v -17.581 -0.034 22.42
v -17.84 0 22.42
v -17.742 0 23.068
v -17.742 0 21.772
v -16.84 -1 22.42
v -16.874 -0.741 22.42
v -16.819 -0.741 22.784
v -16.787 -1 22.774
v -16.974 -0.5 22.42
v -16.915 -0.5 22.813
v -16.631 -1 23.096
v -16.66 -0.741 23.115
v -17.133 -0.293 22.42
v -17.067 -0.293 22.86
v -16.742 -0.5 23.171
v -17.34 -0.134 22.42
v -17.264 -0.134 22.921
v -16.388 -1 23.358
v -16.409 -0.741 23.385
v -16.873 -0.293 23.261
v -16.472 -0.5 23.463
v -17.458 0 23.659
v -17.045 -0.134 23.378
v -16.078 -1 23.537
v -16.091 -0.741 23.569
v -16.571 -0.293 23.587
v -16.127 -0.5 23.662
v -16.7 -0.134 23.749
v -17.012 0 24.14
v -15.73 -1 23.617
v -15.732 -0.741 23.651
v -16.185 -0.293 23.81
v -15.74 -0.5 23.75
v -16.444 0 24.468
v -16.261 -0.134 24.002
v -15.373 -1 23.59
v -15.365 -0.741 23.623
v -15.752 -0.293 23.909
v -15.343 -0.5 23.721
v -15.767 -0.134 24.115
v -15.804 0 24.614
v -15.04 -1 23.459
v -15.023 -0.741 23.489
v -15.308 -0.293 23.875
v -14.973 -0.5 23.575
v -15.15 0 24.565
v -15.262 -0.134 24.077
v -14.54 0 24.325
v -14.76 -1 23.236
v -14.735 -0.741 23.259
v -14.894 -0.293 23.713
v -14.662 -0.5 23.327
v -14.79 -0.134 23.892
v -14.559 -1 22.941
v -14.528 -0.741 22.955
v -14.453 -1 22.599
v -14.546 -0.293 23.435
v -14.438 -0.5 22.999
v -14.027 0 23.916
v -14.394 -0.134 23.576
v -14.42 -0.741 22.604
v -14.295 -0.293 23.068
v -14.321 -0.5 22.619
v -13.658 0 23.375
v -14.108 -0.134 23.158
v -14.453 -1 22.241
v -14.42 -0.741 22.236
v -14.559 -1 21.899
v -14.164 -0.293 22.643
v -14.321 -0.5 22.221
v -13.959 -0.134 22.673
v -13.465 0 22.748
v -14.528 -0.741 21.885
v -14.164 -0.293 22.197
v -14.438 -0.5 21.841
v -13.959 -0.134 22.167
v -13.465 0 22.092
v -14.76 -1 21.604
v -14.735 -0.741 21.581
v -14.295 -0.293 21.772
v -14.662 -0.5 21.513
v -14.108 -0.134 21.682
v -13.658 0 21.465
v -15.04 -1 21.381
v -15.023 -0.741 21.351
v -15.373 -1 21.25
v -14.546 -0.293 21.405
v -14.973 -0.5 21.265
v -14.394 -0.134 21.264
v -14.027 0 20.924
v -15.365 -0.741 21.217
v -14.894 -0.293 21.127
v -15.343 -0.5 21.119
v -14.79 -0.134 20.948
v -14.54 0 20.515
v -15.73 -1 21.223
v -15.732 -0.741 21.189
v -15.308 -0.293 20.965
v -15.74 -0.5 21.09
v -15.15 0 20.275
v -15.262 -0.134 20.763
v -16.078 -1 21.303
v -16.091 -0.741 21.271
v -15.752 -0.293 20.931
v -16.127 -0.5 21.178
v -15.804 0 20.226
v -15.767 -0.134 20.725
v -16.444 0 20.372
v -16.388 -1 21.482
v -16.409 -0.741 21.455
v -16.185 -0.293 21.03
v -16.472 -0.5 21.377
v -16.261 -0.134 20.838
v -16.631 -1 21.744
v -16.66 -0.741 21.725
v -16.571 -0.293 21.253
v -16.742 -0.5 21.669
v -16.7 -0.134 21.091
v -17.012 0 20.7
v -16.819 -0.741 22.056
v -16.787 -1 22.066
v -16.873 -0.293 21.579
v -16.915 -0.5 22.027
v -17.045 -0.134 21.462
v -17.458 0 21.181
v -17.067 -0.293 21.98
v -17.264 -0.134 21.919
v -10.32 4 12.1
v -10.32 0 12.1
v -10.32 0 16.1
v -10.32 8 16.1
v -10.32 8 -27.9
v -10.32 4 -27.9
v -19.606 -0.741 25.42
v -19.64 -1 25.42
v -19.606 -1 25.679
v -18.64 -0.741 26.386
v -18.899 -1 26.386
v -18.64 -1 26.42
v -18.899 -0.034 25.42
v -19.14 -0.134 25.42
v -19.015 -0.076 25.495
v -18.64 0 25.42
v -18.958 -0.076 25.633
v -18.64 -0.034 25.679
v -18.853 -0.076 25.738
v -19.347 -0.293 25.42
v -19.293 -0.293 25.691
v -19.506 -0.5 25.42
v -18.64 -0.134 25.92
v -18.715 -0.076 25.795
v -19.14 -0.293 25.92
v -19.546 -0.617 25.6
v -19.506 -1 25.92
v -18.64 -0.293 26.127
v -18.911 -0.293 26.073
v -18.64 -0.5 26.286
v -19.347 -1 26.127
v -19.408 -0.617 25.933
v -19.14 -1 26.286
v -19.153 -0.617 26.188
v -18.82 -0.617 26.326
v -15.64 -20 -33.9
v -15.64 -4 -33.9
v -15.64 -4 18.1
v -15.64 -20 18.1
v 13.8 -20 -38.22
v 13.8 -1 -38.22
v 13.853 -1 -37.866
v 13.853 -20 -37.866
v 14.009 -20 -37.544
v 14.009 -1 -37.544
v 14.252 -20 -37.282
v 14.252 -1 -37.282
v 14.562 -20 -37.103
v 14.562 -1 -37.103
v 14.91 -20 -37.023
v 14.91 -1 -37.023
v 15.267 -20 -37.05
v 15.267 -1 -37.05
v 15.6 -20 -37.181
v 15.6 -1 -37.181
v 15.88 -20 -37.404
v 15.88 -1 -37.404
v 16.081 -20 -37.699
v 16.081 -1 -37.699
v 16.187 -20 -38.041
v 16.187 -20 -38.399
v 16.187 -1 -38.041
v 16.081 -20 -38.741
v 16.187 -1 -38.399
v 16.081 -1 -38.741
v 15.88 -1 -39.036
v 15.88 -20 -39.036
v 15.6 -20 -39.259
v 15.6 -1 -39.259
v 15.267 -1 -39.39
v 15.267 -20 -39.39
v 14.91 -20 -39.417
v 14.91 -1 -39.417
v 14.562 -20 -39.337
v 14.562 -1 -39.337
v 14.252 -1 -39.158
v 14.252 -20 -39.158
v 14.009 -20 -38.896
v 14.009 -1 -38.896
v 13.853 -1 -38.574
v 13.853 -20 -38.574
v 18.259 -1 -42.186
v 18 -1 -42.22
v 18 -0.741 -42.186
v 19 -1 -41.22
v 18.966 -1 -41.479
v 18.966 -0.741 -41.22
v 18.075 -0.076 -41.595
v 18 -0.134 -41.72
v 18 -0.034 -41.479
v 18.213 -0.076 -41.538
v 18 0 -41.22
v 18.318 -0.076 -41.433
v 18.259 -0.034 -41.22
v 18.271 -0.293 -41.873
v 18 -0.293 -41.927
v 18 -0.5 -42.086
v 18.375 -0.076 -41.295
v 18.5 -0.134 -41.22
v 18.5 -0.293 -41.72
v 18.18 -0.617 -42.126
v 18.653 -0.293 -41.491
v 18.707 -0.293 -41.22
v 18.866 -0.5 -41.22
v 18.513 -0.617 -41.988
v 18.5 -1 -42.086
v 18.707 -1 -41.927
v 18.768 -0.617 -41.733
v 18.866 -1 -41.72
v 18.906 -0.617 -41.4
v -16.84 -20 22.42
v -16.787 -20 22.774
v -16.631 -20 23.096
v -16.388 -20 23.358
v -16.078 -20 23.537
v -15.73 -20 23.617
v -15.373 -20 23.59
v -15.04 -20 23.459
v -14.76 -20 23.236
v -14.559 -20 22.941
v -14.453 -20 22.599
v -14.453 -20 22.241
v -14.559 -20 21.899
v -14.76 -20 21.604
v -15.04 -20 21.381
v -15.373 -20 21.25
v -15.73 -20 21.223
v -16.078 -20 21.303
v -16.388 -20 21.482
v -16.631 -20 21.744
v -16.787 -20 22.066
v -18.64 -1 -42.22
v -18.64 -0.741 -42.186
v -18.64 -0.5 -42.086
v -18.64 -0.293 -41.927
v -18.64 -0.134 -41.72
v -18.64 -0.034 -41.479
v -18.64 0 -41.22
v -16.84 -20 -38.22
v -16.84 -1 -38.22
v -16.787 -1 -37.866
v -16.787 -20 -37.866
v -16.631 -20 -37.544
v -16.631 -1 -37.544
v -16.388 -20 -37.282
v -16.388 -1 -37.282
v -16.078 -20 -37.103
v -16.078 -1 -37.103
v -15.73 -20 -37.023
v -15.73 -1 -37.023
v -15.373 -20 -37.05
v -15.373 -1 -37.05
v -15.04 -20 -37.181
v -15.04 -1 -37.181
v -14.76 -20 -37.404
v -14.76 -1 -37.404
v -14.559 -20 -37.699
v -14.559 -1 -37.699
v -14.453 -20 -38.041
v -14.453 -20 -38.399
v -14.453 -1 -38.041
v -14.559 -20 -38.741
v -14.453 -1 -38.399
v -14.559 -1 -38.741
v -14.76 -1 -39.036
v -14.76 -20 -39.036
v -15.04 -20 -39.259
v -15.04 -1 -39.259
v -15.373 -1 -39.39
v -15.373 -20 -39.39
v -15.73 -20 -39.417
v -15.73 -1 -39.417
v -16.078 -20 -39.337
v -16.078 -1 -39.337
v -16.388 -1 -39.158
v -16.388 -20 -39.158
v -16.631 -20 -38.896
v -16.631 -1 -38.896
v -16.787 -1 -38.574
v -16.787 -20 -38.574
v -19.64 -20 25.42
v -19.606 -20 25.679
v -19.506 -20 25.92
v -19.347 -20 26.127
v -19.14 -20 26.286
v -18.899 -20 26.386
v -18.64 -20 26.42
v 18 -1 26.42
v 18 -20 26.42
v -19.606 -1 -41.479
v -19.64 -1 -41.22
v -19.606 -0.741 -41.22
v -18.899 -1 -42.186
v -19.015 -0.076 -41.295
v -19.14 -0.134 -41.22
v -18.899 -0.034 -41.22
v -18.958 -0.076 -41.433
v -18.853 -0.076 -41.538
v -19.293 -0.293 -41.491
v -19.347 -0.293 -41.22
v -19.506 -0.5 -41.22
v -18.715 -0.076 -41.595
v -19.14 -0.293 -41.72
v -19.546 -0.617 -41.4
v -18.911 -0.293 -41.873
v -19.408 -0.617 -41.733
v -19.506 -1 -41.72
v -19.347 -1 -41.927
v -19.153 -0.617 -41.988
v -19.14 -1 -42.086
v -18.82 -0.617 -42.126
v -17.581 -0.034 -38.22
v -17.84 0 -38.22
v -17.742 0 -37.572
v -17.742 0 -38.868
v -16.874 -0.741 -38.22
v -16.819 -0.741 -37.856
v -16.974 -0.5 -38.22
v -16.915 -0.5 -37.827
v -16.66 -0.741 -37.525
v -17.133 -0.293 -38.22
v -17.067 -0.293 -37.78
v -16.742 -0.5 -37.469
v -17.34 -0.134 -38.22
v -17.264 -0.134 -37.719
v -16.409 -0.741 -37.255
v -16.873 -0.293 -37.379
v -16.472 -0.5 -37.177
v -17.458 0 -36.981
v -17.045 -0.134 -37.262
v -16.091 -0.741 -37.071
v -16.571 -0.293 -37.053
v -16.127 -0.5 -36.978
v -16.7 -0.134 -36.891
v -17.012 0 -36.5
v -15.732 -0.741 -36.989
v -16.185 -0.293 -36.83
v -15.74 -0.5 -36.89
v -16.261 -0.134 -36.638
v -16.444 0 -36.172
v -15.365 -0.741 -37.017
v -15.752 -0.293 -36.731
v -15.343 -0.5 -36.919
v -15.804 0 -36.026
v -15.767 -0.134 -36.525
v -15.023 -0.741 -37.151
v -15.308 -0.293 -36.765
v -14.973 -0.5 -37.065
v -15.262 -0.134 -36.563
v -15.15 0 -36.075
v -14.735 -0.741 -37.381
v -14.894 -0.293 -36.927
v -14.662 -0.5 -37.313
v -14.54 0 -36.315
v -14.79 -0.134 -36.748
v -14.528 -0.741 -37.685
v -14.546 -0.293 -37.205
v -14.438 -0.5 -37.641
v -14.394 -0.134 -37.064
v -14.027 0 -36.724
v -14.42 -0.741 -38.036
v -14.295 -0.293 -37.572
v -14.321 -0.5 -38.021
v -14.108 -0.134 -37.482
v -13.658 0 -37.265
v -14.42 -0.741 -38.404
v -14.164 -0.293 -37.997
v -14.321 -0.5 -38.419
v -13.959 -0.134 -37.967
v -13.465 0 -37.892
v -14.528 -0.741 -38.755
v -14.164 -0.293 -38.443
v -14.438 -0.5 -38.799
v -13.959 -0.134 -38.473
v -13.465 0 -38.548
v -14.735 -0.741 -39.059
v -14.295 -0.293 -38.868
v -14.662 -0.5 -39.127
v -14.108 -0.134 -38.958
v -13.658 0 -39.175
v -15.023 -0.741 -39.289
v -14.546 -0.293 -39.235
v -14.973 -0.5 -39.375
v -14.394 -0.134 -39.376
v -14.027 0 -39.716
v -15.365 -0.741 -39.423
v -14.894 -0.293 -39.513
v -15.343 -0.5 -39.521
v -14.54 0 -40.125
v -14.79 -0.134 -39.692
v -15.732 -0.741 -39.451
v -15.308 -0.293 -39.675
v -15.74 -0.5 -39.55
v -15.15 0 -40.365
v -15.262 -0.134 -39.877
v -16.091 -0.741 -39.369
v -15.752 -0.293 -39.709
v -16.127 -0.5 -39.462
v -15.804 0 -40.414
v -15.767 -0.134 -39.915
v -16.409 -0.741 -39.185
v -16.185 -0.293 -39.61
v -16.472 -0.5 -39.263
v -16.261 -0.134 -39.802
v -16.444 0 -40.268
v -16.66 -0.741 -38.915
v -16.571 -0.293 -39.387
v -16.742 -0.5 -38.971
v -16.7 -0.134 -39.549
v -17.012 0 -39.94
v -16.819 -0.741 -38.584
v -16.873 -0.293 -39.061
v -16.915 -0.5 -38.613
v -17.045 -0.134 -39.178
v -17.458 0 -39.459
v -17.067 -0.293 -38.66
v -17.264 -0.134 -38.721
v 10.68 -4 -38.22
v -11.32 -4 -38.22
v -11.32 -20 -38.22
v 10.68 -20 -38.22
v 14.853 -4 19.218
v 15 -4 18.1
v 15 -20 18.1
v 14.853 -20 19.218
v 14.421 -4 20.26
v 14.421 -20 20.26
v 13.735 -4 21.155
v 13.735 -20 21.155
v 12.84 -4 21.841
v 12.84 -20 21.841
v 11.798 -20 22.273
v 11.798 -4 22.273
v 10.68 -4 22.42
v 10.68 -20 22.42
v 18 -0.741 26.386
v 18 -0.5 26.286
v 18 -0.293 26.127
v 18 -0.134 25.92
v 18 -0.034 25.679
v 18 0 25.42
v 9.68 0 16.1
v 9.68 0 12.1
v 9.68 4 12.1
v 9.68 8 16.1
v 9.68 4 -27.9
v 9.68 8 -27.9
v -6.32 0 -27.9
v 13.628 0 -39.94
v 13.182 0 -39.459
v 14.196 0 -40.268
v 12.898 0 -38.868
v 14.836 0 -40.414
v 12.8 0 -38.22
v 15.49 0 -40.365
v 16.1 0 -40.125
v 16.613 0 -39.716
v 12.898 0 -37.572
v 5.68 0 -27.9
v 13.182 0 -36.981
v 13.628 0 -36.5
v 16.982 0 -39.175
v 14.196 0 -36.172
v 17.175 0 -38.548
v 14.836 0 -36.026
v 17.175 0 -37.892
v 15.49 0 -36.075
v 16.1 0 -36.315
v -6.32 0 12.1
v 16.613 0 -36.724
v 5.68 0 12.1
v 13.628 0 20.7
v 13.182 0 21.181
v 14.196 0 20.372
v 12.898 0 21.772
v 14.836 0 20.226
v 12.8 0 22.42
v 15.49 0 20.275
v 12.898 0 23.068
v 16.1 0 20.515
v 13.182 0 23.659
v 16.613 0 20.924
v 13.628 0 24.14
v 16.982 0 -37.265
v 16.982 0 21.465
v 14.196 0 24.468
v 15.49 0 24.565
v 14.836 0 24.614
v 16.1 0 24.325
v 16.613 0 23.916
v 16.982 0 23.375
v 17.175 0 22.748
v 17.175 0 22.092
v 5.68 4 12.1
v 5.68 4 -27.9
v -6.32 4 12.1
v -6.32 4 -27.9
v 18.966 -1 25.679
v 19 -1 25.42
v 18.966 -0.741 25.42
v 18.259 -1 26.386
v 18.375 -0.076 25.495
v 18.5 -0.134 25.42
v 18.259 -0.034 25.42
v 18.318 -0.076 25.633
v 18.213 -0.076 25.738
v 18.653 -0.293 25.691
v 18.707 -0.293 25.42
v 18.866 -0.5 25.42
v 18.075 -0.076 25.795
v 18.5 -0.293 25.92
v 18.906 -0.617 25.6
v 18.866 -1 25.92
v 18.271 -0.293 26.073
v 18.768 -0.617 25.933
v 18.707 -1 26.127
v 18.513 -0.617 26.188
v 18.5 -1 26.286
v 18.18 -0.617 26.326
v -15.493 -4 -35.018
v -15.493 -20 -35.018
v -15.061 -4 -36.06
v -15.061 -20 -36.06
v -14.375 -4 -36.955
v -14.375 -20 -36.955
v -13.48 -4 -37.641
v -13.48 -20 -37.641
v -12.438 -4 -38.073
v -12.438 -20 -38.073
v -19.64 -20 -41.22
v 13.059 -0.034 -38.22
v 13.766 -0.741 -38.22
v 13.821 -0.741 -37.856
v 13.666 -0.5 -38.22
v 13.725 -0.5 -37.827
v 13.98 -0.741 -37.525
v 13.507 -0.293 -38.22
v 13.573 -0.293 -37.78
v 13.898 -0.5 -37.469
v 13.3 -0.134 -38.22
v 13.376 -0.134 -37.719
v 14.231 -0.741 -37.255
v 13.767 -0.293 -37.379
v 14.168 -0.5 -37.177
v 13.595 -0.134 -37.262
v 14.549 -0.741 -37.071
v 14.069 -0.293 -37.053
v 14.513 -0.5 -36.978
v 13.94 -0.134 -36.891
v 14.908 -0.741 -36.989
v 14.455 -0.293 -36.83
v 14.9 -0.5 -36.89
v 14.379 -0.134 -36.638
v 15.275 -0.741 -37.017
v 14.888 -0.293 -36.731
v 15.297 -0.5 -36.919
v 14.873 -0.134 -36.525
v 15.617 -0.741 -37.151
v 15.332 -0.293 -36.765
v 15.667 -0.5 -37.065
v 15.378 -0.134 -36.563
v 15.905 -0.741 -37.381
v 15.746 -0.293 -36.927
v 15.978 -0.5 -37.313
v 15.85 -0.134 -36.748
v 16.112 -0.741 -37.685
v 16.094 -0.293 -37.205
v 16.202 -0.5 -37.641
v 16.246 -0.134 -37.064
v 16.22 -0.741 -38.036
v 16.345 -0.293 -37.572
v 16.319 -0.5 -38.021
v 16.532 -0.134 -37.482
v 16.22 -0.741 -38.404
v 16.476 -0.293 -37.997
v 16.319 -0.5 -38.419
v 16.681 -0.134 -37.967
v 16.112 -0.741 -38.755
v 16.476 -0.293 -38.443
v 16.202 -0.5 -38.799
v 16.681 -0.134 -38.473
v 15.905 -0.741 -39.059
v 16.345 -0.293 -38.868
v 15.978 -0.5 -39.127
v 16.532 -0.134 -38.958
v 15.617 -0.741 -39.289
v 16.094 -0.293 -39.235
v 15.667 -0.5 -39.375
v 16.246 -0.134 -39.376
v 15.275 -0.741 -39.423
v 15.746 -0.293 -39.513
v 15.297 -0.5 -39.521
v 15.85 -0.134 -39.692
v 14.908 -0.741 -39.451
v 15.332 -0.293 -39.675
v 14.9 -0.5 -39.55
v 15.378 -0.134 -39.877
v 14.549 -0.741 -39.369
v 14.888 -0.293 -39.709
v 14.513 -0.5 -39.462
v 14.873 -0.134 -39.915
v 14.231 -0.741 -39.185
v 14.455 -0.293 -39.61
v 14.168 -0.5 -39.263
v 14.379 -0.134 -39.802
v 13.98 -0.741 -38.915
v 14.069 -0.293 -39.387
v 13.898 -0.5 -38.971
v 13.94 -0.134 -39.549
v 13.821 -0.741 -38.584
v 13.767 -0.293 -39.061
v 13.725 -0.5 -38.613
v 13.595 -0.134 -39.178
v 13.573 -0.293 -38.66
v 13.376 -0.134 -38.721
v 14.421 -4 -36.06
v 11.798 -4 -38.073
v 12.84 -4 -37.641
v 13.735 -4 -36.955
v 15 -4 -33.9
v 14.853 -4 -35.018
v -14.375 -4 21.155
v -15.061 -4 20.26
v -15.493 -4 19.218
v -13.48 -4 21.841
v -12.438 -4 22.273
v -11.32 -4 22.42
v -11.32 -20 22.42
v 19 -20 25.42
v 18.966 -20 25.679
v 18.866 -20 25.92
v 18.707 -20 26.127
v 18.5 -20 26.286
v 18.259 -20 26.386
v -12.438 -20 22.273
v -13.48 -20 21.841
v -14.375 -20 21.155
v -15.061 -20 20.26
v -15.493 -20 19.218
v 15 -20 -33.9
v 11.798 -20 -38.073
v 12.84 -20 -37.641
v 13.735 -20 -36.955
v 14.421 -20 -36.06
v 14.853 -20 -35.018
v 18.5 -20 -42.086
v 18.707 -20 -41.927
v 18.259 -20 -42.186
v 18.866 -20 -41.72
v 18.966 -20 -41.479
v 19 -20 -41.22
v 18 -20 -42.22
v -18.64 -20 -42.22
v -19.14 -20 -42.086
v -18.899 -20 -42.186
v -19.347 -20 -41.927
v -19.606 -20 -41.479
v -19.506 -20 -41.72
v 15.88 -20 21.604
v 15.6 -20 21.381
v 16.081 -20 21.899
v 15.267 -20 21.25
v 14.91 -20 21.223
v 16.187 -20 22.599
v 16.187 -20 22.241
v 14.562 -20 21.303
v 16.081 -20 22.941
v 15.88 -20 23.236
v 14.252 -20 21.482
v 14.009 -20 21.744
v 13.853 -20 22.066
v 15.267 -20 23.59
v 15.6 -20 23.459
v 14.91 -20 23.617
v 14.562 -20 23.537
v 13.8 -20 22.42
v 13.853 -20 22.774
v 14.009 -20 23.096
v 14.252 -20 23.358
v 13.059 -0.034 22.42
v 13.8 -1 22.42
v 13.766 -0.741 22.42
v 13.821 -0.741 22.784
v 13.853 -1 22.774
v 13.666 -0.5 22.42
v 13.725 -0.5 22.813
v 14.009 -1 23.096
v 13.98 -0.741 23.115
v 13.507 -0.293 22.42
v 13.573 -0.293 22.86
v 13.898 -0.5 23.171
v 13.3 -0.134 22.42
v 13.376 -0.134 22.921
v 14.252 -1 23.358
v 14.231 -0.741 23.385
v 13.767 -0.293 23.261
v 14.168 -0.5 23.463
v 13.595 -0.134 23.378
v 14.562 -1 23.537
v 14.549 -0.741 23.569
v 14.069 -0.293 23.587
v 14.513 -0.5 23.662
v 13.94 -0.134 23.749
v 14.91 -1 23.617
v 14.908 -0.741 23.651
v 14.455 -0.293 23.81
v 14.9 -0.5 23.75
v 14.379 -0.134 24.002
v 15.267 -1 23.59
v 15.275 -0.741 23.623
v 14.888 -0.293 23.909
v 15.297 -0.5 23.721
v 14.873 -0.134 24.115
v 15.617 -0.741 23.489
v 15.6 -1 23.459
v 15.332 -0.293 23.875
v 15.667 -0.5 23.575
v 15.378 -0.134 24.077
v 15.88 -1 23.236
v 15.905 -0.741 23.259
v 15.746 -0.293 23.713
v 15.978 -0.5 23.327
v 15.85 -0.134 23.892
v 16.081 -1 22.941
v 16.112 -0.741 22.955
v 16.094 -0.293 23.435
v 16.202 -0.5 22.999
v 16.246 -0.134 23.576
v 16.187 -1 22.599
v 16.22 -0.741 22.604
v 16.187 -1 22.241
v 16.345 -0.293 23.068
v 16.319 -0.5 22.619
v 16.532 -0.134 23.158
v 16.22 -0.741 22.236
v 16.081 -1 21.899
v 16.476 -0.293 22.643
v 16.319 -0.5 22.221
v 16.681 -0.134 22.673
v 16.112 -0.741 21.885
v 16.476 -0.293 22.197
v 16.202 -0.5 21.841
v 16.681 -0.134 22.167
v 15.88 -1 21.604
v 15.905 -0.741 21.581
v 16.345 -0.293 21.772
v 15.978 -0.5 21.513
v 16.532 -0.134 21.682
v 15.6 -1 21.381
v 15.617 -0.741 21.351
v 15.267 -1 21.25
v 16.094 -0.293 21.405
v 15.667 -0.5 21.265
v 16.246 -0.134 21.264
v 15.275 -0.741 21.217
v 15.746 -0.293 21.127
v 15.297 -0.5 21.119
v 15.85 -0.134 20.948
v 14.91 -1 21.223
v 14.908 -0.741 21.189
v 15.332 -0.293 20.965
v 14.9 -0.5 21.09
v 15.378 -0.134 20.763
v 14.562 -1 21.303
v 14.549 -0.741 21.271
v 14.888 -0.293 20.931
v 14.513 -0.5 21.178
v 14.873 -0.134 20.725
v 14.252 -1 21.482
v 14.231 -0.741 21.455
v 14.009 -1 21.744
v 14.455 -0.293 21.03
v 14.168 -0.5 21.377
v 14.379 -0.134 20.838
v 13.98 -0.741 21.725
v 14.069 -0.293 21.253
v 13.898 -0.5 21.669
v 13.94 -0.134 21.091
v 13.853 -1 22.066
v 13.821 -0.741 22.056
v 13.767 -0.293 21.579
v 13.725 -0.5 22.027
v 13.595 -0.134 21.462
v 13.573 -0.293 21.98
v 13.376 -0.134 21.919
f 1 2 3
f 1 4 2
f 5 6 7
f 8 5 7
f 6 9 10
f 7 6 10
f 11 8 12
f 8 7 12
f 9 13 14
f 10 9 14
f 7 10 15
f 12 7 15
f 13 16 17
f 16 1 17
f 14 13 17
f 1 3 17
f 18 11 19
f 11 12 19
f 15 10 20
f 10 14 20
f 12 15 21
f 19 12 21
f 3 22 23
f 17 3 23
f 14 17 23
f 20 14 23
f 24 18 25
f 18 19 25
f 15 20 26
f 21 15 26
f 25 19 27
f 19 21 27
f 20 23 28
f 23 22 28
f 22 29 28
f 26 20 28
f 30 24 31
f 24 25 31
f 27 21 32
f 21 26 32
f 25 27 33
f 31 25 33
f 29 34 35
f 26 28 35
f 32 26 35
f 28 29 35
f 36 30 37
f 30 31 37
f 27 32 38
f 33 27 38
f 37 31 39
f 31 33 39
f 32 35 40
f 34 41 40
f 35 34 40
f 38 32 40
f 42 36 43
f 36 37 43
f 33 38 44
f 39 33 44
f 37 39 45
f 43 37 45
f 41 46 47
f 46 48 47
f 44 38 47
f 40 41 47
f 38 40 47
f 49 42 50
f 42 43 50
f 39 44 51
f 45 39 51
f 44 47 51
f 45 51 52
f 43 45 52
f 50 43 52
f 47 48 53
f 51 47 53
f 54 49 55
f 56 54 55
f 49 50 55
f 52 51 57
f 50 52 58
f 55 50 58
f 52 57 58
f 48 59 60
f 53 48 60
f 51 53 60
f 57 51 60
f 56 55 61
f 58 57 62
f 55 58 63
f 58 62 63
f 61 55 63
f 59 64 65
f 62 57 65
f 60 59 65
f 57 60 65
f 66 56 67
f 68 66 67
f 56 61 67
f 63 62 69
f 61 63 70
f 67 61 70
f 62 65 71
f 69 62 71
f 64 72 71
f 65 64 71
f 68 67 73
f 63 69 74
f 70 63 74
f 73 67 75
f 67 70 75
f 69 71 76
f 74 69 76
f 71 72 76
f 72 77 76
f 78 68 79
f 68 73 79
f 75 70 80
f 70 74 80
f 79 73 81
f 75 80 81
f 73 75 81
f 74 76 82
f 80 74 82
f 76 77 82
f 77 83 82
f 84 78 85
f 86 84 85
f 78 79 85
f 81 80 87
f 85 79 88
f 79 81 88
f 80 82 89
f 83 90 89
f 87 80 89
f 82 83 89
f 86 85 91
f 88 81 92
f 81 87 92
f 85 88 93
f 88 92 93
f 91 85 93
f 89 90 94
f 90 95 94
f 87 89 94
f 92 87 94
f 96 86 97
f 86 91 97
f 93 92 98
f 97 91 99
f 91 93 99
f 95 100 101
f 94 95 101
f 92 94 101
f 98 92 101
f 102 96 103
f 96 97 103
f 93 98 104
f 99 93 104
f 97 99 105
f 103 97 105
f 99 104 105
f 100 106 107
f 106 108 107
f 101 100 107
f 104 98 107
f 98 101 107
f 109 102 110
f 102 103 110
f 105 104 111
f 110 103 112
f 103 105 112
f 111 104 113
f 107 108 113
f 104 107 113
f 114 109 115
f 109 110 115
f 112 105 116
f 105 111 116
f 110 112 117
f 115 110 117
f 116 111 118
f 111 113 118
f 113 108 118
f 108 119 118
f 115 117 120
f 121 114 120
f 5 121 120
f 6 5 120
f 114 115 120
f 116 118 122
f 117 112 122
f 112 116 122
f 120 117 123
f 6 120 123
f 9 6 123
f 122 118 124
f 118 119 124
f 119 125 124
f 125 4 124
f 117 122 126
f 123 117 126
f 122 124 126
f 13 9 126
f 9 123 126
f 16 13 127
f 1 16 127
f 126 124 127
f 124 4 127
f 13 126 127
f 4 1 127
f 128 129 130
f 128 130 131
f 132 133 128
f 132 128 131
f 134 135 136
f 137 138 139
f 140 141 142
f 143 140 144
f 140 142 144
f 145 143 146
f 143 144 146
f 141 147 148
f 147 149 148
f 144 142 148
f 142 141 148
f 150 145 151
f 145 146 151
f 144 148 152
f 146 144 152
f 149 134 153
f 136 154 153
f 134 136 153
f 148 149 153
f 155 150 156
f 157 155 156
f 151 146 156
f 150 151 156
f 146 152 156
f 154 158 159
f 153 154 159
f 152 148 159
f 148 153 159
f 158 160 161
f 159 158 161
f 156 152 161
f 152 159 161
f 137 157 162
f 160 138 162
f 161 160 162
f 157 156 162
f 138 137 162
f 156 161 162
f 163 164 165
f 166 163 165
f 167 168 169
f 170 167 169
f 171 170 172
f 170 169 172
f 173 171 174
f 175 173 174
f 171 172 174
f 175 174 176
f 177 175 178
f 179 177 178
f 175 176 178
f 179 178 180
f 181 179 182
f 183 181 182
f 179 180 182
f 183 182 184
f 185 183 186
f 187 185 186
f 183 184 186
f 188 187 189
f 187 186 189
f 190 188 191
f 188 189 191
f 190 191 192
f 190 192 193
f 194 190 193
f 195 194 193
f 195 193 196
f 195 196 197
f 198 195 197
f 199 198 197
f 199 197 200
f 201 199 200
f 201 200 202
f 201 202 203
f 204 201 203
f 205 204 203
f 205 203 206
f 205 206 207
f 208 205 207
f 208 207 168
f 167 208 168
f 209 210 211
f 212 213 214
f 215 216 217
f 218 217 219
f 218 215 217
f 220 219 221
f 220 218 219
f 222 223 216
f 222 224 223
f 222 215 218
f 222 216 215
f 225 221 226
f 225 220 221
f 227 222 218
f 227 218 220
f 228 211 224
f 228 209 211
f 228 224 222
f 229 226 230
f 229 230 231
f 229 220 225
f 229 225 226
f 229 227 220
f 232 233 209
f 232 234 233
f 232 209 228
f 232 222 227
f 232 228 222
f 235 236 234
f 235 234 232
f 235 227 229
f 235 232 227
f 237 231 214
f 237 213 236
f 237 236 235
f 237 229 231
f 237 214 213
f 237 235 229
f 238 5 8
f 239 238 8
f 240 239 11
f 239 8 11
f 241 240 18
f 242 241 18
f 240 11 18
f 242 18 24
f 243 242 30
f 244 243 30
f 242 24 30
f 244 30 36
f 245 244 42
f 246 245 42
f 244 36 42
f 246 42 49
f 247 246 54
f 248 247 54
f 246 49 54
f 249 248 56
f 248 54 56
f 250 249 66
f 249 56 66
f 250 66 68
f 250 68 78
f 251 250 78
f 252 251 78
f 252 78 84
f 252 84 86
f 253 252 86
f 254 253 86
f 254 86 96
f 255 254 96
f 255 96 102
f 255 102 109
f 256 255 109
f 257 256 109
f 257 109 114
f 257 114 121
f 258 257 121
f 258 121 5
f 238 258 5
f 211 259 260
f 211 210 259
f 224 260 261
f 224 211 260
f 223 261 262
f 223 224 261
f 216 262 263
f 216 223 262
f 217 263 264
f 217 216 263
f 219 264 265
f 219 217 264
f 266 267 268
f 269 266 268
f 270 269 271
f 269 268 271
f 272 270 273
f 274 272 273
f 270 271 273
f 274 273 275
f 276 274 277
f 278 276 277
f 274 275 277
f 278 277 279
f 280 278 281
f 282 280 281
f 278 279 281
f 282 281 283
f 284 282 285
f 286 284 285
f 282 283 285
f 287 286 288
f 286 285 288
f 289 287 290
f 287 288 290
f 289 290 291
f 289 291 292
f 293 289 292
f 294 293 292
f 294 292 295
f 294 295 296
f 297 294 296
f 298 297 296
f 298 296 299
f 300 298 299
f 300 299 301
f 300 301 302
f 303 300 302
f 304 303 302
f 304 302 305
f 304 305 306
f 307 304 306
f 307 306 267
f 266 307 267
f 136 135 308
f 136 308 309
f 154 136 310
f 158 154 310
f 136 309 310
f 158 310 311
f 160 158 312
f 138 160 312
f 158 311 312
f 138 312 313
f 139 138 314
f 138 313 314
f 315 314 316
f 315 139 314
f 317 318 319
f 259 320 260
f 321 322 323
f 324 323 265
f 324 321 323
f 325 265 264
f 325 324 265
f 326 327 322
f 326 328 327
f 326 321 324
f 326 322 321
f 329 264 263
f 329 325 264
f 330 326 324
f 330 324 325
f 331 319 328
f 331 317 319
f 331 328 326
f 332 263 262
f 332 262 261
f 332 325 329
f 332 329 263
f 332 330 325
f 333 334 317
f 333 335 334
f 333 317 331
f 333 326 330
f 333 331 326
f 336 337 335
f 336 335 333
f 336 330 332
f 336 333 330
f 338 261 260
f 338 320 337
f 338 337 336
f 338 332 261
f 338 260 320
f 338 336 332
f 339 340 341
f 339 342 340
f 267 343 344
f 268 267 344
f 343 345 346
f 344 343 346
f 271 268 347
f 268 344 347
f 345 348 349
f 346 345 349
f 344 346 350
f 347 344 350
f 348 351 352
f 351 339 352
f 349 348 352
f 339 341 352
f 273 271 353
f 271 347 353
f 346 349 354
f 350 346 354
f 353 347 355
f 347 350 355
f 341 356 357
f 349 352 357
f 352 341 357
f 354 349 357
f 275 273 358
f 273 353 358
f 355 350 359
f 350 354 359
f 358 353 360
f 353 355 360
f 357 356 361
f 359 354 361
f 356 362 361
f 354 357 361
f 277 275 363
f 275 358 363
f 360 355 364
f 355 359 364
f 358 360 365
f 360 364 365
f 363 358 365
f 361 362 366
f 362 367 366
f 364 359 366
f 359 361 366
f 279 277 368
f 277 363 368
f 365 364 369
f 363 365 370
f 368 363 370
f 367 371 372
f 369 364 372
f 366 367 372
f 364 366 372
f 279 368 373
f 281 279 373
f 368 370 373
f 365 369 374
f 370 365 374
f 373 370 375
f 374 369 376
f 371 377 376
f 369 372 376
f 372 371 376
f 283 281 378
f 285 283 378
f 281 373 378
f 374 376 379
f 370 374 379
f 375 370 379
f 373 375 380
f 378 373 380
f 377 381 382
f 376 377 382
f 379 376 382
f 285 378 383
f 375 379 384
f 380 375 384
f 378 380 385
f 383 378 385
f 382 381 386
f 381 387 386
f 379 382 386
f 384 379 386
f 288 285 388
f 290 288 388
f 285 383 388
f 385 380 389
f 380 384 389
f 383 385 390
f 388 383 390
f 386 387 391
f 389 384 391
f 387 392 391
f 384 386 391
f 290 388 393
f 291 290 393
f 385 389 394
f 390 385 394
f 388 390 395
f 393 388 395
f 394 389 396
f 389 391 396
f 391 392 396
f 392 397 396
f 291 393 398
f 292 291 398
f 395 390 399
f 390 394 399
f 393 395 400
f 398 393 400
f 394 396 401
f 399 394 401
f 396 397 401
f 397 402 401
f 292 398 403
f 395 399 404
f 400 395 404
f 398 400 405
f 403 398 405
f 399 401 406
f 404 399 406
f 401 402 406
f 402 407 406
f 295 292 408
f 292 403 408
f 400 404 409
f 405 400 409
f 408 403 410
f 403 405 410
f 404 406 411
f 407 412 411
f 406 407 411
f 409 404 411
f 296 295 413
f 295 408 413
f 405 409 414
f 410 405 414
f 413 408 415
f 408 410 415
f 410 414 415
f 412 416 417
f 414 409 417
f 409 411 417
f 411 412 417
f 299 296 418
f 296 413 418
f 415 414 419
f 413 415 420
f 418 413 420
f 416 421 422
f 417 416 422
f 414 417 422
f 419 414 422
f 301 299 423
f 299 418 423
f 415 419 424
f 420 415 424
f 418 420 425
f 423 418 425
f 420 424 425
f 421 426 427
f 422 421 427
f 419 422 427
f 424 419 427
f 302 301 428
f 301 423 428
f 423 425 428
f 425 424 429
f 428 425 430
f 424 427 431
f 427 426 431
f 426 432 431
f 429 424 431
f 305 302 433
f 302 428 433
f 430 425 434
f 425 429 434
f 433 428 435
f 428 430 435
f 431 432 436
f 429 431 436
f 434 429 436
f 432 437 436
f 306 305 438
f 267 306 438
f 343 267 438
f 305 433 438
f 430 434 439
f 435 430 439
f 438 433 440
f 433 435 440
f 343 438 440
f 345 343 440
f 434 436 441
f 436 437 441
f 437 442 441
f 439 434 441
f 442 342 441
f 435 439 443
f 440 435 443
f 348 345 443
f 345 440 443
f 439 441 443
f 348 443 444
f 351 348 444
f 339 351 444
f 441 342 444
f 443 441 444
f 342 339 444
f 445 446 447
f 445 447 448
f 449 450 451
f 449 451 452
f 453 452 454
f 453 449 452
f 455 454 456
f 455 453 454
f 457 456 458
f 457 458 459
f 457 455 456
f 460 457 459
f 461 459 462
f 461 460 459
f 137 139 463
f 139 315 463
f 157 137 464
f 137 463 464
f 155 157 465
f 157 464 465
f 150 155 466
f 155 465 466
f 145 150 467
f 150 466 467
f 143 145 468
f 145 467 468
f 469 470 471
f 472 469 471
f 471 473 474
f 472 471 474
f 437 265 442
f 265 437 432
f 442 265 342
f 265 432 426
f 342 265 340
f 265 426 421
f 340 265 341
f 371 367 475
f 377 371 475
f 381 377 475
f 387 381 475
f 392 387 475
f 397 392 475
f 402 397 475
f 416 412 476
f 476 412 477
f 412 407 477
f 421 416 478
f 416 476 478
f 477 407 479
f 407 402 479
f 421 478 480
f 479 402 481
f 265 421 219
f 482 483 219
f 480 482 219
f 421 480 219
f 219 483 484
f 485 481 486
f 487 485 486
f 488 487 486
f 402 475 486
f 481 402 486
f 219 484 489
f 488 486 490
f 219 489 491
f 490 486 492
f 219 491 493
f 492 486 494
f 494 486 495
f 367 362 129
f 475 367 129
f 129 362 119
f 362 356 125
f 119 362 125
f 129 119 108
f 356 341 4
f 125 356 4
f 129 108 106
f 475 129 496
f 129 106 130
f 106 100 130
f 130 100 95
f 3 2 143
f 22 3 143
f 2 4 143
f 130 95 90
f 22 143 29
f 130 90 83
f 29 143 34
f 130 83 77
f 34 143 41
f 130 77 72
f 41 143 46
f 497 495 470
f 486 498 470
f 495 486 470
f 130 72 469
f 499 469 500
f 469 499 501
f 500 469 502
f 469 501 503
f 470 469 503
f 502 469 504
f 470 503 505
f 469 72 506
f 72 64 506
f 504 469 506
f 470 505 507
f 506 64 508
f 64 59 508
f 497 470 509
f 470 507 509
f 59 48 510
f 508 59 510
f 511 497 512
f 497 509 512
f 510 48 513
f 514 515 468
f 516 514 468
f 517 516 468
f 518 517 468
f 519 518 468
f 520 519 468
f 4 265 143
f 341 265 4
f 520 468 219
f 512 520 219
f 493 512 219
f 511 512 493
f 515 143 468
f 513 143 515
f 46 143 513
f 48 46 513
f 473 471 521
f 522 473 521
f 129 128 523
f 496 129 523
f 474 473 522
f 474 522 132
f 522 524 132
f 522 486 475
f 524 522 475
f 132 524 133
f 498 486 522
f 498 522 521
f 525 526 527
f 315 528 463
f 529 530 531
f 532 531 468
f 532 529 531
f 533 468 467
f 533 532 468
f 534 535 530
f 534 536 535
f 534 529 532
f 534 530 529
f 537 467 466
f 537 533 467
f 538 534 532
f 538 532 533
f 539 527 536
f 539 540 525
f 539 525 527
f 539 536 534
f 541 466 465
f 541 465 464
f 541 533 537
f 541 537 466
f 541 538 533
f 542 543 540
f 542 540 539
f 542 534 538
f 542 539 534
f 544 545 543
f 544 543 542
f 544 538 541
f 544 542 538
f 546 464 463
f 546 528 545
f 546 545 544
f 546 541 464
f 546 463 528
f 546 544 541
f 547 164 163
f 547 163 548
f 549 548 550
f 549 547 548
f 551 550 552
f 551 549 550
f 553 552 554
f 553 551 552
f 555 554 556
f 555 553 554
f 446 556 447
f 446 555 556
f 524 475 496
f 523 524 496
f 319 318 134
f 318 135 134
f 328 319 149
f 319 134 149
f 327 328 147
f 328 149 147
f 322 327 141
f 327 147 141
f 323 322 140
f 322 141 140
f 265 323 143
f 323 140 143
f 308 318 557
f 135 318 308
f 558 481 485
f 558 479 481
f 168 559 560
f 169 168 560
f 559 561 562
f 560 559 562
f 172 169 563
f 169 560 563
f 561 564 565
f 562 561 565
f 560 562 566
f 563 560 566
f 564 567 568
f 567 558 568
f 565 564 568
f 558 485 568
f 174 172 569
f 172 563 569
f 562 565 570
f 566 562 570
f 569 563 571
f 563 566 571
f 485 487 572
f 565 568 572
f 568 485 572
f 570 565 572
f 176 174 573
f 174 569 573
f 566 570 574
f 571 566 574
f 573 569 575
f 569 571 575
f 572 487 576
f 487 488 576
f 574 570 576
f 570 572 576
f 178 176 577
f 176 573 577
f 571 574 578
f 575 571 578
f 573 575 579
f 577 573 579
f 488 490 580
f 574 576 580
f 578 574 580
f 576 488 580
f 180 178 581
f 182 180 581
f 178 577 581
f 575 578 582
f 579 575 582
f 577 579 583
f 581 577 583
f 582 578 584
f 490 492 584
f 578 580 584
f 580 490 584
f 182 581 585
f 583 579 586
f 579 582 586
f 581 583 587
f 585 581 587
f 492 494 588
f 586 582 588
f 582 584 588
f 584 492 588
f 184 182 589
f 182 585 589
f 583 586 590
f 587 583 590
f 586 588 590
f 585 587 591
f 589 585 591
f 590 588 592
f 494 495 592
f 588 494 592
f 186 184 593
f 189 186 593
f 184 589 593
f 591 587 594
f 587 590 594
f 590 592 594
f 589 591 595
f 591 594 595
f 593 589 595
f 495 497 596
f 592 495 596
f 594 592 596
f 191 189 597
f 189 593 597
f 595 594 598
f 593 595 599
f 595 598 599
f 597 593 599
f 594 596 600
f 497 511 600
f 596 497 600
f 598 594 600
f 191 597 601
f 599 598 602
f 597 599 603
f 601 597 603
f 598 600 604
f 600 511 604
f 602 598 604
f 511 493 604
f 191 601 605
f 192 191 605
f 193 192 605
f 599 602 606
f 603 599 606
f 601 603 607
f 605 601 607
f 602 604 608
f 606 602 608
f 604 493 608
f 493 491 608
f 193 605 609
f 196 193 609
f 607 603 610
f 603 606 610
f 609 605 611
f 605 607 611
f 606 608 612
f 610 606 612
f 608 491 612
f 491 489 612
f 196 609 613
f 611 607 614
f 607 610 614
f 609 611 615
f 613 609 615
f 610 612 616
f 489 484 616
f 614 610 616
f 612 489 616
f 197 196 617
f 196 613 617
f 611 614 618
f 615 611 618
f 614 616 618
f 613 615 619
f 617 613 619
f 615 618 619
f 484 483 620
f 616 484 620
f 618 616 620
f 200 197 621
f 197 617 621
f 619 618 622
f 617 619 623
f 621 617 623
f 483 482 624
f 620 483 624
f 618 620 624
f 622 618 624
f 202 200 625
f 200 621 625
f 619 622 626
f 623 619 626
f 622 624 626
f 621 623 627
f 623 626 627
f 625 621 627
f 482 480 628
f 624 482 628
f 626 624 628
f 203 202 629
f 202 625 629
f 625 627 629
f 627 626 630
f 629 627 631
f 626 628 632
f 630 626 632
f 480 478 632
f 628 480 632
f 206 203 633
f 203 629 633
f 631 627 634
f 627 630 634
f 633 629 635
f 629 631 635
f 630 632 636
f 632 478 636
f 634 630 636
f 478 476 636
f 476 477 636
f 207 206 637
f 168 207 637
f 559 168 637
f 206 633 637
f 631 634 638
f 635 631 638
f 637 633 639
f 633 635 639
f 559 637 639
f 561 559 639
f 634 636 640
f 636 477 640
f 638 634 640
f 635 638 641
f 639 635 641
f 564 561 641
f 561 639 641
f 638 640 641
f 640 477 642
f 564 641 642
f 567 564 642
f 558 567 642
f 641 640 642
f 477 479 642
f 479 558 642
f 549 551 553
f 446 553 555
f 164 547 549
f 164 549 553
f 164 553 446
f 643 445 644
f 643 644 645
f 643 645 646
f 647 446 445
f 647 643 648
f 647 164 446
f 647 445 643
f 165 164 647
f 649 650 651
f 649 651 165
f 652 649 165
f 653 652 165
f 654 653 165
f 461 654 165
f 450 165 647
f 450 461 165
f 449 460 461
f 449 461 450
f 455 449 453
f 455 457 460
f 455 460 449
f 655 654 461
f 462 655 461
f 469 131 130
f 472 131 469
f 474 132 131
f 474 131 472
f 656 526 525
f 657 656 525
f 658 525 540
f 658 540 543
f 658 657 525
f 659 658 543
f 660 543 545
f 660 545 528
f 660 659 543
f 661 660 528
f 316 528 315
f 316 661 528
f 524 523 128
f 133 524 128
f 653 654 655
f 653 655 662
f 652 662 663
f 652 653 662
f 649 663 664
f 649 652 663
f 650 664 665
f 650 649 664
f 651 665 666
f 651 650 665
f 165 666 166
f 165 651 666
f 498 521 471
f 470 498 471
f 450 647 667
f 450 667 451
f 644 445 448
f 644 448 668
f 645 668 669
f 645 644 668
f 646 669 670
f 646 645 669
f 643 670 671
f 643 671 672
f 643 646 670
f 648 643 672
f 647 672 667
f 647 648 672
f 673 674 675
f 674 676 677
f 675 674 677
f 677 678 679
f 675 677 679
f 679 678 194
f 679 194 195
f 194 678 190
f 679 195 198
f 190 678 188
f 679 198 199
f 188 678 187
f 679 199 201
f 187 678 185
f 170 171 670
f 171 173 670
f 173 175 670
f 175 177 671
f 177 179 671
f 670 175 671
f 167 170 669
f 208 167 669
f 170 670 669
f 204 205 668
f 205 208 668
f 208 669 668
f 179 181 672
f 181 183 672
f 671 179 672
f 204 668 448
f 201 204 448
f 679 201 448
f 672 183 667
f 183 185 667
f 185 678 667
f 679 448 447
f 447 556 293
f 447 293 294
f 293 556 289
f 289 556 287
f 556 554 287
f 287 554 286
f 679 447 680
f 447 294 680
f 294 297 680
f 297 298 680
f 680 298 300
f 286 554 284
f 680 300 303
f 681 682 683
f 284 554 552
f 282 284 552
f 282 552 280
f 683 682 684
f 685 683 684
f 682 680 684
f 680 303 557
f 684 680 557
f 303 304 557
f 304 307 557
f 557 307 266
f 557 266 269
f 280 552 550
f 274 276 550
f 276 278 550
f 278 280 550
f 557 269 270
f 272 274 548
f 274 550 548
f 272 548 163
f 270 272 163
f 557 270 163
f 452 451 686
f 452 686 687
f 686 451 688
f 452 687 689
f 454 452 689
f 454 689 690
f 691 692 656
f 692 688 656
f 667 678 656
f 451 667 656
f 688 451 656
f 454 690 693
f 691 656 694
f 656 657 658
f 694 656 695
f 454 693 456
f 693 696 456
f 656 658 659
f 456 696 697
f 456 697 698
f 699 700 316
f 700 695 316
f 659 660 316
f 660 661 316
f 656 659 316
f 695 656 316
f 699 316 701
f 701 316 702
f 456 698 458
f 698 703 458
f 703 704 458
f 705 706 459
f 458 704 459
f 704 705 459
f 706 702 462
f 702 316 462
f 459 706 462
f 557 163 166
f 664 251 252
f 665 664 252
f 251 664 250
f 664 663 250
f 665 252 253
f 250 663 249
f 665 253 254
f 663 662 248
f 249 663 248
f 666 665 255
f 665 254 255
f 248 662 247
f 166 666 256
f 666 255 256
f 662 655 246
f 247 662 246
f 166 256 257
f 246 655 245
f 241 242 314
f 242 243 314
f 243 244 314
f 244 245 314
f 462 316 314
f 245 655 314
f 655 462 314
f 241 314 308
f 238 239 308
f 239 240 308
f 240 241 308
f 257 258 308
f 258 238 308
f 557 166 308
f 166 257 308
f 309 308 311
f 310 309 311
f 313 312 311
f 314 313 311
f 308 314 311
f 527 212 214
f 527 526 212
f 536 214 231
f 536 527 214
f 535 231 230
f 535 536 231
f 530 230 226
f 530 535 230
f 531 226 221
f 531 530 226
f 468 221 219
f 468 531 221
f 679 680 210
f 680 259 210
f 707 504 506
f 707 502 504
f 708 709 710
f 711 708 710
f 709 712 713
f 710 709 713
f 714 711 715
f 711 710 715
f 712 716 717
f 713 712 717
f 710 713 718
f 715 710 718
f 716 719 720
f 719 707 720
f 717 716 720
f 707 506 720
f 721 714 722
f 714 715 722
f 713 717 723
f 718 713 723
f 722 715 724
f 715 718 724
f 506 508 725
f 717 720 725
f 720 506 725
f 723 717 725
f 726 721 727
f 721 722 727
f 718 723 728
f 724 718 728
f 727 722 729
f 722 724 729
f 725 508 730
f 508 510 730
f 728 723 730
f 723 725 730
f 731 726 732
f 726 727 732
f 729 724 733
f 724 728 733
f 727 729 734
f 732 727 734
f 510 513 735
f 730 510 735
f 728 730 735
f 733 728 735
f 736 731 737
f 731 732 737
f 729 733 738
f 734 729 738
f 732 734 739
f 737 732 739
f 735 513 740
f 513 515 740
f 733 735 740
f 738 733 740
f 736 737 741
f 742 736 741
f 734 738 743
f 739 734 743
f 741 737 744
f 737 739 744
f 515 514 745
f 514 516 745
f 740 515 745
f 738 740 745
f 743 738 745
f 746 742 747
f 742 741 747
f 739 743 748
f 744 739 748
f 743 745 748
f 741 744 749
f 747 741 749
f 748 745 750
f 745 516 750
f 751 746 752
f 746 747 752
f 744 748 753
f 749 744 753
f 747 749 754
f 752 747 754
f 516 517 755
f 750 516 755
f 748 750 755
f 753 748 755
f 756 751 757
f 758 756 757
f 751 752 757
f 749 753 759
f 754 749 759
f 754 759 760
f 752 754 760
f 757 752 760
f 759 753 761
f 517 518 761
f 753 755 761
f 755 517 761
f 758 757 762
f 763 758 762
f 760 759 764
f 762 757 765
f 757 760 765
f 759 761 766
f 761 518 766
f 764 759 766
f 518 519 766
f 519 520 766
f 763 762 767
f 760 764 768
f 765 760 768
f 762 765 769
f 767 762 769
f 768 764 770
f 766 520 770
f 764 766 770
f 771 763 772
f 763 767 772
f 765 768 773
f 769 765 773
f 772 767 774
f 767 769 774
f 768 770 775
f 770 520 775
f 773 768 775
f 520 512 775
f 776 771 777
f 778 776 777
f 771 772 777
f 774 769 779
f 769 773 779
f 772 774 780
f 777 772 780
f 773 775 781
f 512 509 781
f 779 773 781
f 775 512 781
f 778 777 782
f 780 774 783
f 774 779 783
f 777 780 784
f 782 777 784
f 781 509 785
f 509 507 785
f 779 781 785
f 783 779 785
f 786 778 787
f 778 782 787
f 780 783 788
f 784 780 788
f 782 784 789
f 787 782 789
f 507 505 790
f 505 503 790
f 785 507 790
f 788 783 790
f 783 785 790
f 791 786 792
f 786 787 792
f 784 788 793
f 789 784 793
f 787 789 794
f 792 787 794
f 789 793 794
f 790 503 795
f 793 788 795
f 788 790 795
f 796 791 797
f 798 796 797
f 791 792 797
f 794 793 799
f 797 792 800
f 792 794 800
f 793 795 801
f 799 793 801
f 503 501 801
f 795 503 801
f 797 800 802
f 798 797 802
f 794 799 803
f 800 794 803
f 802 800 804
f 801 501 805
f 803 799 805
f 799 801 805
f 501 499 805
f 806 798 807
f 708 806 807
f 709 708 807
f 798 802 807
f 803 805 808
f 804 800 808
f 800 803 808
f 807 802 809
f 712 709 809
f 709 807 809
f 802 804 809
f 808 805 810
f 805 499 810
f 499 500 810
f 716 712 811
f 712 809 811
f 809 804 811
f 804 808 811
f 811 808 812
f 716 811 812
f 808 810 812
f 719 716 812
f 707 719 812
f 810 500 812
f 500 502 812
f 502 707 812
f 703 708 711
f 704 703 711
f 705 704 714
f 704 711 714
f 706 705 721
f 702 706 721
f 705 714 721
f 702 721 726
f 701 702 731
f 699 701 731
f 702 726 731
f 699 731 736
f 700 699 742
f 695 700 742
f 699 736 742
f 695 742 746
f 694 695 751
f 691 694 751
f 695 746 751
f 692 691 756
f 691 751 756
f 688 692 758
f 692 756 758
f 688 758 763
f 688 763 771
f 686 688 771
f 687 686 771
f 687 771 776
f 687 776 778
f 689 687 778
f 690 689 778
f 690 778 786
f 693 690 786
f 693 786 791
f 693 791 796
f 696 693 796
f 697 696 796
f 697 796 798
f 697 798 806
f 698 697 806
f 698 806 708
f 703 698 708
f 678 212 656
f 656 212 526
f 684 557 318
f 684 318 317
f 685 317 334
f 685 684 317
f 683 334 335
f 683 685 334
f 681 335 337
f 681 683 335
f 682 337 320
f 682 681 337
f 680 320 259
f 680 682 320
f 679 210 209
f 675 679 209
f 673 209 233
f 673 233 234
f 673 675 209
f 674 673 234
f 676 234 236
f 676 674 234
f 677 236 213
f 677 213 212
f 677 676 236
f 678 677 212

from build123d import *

# Parameters (mm, degrees)
SKETCH001_W   = 38.64
SKETCH001_H   = 68.64
PAD001_DEPTH  = 20
THICKNESS_T   = -4
FILLET002_R   = 1
PAD006_DEPTH  = 16
SKETCH013_R   = 1.2
HOLE002_DEPTH = 25
FILLET004_R   = 1
SKETCH018_W   = 12
SKETCH018_H   = 40
PAD008_DEPTH  = 4
SKETCH019_W   = 20
SKETCH019_H   = 40
PAD009_DEPTH  = 4
SKETCH020_W   = 20
SKETCH020_H   = 8
PAD010_DEPTH  = 4


with BuildPart() as part:
    # Sketch001 → Pad001 (new body)
    with BuildSketch(Plane.XZ):
        with Locations((-0.32, -7.9)):
            Rectangle(SKETCH001_W, SKETCH001_H)
    extrude(amount=PAD001_DEPTH)

    # Thickness
    thickness_openings = [part.faces().sort_by_distance(p)[0] for p in [
        (-0.32, -20, -7.9),
    ]]
    offset(amount=THICKNESS_T, openings=thickness_openings)

    # Fillet002
    fillet002_edges = [part.edges().sort_by_distance(p)[0] for p in [
        (-19.64, -10, 26.42),
        (19, -10, 26.42),
        (19, -10, -42.22),
        (-19.64, -10, -42.22),
        (-19.64, 0, -7.9),
        (-0.32, 0, -42.22),
        (19, 0, -7.9),
        (-0.32, 0, 26.42),
    ]]
    fillet(fillet002_edges, radius=FILLET002_R)

    # Sketch012 (on Face23 of Fillet002) → Pad006 (join)
    with BuildSketch(Plane.XZ.offset(4)):
        with BuildLine():
            ThreePointArc((-11.32, 22.42), (-14.374701, 21.154701), (-15.64, 18.1))
            Line((-15.64, 22.42), (-15.64, 18.1))
            Line((-11.32, 22.42), (-15.64, 22.42))
        make_face()
        with BuildLine():
            ThreePointArc((15, 18.1), (13.734701, 21.154701), (10.68, 22.42))
            Line((10.68, 22.42), (15, 22.42))
            Line((15, 22.42), (15, 18.1))
        make_face()
        with BuildLine():
            ThreePointArc((10.68, -38.22), (13.734701, -36.954701), (15, -33.9))
            Line((15, -38.22), (15, -33.9))
            Line((10.68, -38.22), (15, -38.22))
        make_face()
        with BuildLine():
            Line((-15.64, -38.22), (-15.64, -33.9))
            ThreePointArc((-15.64, -33.9), (-14.374701, -36.954701), (-11.32, -38.22))
            Line((-11.32, -38.22), (-15.64, -38.22))
        make_face()
    extrude(amount=PAD006_DEPTH)

    # Sketch013 (on Face12 of Pad006) → Hole002 (cut)
    with BuildSketch(Plane(origin=(0, 0, 0), x_dir=(-1, 0, 0), z_dir=(0, 1, 0))):
        with Locations((-15, 22.42)):
            Circle(SKETCH013_R)
        with Locations((15.64, 22.42)):
            Circle(SKETCH013_R)
        with Locations((-15, -38.22)):
            Circle(SKETCH013_R)
        with Locations((15.64, -38.22)):
            Circle(SKETCH013_R)
    extrude(amount=-HOLE002_DEPTH, mode=Mode.SUBTRACT)

    # Fillet004
    fillet004_edges = [part.edges().sort_by_distance(p)[0] for p in [
        (-16.84, 0, 22.42),
        (13.8, 0, 22.42),
        (13.8, 0, -38.22),
        (-16.84, 0, -38.22),
    ]]
    fillet(fillet004_edges, radius=FILLET004_R)

    # Sketch018 (on Face4 of Fillet004) → Pad008 (join)
    with BuildSketch(Plane(origin=(0, 0, 0), x_dir=(-1, 0, 0), z_dir=(0, 1, 0))):
        with Locations((0.32, -7.9)):
            Rectangle(SKETCH018_W, SKETCH018_H)
    extrude(amount=PAD008_DEPTH)

    # Sketch019 (on Face40 of Pad008) → Pad009 (join)
    with BuildSketch(Plane(origin=(0, 4, 0), x_dir=(-1, 0, 0), z_dir=(0, 1, 0))):
        with Locations((0.32, -7.9)):
            Rectangle(SKETCH019_W, SKETCH019_H)
    extrude(amount=PAD009_DEPTH)

    # Sketch020 (on Face44 of Pad009) → Pad010 (join)
    with BuildSketch(Plane.XY.offset(12.1)):
        with Locations((-0.32, 4)):
            Rectangle(SKETCH020_W, SKETCH020_H)
    extrude(amount=PAD010_DEPTH)


solid = part.part
